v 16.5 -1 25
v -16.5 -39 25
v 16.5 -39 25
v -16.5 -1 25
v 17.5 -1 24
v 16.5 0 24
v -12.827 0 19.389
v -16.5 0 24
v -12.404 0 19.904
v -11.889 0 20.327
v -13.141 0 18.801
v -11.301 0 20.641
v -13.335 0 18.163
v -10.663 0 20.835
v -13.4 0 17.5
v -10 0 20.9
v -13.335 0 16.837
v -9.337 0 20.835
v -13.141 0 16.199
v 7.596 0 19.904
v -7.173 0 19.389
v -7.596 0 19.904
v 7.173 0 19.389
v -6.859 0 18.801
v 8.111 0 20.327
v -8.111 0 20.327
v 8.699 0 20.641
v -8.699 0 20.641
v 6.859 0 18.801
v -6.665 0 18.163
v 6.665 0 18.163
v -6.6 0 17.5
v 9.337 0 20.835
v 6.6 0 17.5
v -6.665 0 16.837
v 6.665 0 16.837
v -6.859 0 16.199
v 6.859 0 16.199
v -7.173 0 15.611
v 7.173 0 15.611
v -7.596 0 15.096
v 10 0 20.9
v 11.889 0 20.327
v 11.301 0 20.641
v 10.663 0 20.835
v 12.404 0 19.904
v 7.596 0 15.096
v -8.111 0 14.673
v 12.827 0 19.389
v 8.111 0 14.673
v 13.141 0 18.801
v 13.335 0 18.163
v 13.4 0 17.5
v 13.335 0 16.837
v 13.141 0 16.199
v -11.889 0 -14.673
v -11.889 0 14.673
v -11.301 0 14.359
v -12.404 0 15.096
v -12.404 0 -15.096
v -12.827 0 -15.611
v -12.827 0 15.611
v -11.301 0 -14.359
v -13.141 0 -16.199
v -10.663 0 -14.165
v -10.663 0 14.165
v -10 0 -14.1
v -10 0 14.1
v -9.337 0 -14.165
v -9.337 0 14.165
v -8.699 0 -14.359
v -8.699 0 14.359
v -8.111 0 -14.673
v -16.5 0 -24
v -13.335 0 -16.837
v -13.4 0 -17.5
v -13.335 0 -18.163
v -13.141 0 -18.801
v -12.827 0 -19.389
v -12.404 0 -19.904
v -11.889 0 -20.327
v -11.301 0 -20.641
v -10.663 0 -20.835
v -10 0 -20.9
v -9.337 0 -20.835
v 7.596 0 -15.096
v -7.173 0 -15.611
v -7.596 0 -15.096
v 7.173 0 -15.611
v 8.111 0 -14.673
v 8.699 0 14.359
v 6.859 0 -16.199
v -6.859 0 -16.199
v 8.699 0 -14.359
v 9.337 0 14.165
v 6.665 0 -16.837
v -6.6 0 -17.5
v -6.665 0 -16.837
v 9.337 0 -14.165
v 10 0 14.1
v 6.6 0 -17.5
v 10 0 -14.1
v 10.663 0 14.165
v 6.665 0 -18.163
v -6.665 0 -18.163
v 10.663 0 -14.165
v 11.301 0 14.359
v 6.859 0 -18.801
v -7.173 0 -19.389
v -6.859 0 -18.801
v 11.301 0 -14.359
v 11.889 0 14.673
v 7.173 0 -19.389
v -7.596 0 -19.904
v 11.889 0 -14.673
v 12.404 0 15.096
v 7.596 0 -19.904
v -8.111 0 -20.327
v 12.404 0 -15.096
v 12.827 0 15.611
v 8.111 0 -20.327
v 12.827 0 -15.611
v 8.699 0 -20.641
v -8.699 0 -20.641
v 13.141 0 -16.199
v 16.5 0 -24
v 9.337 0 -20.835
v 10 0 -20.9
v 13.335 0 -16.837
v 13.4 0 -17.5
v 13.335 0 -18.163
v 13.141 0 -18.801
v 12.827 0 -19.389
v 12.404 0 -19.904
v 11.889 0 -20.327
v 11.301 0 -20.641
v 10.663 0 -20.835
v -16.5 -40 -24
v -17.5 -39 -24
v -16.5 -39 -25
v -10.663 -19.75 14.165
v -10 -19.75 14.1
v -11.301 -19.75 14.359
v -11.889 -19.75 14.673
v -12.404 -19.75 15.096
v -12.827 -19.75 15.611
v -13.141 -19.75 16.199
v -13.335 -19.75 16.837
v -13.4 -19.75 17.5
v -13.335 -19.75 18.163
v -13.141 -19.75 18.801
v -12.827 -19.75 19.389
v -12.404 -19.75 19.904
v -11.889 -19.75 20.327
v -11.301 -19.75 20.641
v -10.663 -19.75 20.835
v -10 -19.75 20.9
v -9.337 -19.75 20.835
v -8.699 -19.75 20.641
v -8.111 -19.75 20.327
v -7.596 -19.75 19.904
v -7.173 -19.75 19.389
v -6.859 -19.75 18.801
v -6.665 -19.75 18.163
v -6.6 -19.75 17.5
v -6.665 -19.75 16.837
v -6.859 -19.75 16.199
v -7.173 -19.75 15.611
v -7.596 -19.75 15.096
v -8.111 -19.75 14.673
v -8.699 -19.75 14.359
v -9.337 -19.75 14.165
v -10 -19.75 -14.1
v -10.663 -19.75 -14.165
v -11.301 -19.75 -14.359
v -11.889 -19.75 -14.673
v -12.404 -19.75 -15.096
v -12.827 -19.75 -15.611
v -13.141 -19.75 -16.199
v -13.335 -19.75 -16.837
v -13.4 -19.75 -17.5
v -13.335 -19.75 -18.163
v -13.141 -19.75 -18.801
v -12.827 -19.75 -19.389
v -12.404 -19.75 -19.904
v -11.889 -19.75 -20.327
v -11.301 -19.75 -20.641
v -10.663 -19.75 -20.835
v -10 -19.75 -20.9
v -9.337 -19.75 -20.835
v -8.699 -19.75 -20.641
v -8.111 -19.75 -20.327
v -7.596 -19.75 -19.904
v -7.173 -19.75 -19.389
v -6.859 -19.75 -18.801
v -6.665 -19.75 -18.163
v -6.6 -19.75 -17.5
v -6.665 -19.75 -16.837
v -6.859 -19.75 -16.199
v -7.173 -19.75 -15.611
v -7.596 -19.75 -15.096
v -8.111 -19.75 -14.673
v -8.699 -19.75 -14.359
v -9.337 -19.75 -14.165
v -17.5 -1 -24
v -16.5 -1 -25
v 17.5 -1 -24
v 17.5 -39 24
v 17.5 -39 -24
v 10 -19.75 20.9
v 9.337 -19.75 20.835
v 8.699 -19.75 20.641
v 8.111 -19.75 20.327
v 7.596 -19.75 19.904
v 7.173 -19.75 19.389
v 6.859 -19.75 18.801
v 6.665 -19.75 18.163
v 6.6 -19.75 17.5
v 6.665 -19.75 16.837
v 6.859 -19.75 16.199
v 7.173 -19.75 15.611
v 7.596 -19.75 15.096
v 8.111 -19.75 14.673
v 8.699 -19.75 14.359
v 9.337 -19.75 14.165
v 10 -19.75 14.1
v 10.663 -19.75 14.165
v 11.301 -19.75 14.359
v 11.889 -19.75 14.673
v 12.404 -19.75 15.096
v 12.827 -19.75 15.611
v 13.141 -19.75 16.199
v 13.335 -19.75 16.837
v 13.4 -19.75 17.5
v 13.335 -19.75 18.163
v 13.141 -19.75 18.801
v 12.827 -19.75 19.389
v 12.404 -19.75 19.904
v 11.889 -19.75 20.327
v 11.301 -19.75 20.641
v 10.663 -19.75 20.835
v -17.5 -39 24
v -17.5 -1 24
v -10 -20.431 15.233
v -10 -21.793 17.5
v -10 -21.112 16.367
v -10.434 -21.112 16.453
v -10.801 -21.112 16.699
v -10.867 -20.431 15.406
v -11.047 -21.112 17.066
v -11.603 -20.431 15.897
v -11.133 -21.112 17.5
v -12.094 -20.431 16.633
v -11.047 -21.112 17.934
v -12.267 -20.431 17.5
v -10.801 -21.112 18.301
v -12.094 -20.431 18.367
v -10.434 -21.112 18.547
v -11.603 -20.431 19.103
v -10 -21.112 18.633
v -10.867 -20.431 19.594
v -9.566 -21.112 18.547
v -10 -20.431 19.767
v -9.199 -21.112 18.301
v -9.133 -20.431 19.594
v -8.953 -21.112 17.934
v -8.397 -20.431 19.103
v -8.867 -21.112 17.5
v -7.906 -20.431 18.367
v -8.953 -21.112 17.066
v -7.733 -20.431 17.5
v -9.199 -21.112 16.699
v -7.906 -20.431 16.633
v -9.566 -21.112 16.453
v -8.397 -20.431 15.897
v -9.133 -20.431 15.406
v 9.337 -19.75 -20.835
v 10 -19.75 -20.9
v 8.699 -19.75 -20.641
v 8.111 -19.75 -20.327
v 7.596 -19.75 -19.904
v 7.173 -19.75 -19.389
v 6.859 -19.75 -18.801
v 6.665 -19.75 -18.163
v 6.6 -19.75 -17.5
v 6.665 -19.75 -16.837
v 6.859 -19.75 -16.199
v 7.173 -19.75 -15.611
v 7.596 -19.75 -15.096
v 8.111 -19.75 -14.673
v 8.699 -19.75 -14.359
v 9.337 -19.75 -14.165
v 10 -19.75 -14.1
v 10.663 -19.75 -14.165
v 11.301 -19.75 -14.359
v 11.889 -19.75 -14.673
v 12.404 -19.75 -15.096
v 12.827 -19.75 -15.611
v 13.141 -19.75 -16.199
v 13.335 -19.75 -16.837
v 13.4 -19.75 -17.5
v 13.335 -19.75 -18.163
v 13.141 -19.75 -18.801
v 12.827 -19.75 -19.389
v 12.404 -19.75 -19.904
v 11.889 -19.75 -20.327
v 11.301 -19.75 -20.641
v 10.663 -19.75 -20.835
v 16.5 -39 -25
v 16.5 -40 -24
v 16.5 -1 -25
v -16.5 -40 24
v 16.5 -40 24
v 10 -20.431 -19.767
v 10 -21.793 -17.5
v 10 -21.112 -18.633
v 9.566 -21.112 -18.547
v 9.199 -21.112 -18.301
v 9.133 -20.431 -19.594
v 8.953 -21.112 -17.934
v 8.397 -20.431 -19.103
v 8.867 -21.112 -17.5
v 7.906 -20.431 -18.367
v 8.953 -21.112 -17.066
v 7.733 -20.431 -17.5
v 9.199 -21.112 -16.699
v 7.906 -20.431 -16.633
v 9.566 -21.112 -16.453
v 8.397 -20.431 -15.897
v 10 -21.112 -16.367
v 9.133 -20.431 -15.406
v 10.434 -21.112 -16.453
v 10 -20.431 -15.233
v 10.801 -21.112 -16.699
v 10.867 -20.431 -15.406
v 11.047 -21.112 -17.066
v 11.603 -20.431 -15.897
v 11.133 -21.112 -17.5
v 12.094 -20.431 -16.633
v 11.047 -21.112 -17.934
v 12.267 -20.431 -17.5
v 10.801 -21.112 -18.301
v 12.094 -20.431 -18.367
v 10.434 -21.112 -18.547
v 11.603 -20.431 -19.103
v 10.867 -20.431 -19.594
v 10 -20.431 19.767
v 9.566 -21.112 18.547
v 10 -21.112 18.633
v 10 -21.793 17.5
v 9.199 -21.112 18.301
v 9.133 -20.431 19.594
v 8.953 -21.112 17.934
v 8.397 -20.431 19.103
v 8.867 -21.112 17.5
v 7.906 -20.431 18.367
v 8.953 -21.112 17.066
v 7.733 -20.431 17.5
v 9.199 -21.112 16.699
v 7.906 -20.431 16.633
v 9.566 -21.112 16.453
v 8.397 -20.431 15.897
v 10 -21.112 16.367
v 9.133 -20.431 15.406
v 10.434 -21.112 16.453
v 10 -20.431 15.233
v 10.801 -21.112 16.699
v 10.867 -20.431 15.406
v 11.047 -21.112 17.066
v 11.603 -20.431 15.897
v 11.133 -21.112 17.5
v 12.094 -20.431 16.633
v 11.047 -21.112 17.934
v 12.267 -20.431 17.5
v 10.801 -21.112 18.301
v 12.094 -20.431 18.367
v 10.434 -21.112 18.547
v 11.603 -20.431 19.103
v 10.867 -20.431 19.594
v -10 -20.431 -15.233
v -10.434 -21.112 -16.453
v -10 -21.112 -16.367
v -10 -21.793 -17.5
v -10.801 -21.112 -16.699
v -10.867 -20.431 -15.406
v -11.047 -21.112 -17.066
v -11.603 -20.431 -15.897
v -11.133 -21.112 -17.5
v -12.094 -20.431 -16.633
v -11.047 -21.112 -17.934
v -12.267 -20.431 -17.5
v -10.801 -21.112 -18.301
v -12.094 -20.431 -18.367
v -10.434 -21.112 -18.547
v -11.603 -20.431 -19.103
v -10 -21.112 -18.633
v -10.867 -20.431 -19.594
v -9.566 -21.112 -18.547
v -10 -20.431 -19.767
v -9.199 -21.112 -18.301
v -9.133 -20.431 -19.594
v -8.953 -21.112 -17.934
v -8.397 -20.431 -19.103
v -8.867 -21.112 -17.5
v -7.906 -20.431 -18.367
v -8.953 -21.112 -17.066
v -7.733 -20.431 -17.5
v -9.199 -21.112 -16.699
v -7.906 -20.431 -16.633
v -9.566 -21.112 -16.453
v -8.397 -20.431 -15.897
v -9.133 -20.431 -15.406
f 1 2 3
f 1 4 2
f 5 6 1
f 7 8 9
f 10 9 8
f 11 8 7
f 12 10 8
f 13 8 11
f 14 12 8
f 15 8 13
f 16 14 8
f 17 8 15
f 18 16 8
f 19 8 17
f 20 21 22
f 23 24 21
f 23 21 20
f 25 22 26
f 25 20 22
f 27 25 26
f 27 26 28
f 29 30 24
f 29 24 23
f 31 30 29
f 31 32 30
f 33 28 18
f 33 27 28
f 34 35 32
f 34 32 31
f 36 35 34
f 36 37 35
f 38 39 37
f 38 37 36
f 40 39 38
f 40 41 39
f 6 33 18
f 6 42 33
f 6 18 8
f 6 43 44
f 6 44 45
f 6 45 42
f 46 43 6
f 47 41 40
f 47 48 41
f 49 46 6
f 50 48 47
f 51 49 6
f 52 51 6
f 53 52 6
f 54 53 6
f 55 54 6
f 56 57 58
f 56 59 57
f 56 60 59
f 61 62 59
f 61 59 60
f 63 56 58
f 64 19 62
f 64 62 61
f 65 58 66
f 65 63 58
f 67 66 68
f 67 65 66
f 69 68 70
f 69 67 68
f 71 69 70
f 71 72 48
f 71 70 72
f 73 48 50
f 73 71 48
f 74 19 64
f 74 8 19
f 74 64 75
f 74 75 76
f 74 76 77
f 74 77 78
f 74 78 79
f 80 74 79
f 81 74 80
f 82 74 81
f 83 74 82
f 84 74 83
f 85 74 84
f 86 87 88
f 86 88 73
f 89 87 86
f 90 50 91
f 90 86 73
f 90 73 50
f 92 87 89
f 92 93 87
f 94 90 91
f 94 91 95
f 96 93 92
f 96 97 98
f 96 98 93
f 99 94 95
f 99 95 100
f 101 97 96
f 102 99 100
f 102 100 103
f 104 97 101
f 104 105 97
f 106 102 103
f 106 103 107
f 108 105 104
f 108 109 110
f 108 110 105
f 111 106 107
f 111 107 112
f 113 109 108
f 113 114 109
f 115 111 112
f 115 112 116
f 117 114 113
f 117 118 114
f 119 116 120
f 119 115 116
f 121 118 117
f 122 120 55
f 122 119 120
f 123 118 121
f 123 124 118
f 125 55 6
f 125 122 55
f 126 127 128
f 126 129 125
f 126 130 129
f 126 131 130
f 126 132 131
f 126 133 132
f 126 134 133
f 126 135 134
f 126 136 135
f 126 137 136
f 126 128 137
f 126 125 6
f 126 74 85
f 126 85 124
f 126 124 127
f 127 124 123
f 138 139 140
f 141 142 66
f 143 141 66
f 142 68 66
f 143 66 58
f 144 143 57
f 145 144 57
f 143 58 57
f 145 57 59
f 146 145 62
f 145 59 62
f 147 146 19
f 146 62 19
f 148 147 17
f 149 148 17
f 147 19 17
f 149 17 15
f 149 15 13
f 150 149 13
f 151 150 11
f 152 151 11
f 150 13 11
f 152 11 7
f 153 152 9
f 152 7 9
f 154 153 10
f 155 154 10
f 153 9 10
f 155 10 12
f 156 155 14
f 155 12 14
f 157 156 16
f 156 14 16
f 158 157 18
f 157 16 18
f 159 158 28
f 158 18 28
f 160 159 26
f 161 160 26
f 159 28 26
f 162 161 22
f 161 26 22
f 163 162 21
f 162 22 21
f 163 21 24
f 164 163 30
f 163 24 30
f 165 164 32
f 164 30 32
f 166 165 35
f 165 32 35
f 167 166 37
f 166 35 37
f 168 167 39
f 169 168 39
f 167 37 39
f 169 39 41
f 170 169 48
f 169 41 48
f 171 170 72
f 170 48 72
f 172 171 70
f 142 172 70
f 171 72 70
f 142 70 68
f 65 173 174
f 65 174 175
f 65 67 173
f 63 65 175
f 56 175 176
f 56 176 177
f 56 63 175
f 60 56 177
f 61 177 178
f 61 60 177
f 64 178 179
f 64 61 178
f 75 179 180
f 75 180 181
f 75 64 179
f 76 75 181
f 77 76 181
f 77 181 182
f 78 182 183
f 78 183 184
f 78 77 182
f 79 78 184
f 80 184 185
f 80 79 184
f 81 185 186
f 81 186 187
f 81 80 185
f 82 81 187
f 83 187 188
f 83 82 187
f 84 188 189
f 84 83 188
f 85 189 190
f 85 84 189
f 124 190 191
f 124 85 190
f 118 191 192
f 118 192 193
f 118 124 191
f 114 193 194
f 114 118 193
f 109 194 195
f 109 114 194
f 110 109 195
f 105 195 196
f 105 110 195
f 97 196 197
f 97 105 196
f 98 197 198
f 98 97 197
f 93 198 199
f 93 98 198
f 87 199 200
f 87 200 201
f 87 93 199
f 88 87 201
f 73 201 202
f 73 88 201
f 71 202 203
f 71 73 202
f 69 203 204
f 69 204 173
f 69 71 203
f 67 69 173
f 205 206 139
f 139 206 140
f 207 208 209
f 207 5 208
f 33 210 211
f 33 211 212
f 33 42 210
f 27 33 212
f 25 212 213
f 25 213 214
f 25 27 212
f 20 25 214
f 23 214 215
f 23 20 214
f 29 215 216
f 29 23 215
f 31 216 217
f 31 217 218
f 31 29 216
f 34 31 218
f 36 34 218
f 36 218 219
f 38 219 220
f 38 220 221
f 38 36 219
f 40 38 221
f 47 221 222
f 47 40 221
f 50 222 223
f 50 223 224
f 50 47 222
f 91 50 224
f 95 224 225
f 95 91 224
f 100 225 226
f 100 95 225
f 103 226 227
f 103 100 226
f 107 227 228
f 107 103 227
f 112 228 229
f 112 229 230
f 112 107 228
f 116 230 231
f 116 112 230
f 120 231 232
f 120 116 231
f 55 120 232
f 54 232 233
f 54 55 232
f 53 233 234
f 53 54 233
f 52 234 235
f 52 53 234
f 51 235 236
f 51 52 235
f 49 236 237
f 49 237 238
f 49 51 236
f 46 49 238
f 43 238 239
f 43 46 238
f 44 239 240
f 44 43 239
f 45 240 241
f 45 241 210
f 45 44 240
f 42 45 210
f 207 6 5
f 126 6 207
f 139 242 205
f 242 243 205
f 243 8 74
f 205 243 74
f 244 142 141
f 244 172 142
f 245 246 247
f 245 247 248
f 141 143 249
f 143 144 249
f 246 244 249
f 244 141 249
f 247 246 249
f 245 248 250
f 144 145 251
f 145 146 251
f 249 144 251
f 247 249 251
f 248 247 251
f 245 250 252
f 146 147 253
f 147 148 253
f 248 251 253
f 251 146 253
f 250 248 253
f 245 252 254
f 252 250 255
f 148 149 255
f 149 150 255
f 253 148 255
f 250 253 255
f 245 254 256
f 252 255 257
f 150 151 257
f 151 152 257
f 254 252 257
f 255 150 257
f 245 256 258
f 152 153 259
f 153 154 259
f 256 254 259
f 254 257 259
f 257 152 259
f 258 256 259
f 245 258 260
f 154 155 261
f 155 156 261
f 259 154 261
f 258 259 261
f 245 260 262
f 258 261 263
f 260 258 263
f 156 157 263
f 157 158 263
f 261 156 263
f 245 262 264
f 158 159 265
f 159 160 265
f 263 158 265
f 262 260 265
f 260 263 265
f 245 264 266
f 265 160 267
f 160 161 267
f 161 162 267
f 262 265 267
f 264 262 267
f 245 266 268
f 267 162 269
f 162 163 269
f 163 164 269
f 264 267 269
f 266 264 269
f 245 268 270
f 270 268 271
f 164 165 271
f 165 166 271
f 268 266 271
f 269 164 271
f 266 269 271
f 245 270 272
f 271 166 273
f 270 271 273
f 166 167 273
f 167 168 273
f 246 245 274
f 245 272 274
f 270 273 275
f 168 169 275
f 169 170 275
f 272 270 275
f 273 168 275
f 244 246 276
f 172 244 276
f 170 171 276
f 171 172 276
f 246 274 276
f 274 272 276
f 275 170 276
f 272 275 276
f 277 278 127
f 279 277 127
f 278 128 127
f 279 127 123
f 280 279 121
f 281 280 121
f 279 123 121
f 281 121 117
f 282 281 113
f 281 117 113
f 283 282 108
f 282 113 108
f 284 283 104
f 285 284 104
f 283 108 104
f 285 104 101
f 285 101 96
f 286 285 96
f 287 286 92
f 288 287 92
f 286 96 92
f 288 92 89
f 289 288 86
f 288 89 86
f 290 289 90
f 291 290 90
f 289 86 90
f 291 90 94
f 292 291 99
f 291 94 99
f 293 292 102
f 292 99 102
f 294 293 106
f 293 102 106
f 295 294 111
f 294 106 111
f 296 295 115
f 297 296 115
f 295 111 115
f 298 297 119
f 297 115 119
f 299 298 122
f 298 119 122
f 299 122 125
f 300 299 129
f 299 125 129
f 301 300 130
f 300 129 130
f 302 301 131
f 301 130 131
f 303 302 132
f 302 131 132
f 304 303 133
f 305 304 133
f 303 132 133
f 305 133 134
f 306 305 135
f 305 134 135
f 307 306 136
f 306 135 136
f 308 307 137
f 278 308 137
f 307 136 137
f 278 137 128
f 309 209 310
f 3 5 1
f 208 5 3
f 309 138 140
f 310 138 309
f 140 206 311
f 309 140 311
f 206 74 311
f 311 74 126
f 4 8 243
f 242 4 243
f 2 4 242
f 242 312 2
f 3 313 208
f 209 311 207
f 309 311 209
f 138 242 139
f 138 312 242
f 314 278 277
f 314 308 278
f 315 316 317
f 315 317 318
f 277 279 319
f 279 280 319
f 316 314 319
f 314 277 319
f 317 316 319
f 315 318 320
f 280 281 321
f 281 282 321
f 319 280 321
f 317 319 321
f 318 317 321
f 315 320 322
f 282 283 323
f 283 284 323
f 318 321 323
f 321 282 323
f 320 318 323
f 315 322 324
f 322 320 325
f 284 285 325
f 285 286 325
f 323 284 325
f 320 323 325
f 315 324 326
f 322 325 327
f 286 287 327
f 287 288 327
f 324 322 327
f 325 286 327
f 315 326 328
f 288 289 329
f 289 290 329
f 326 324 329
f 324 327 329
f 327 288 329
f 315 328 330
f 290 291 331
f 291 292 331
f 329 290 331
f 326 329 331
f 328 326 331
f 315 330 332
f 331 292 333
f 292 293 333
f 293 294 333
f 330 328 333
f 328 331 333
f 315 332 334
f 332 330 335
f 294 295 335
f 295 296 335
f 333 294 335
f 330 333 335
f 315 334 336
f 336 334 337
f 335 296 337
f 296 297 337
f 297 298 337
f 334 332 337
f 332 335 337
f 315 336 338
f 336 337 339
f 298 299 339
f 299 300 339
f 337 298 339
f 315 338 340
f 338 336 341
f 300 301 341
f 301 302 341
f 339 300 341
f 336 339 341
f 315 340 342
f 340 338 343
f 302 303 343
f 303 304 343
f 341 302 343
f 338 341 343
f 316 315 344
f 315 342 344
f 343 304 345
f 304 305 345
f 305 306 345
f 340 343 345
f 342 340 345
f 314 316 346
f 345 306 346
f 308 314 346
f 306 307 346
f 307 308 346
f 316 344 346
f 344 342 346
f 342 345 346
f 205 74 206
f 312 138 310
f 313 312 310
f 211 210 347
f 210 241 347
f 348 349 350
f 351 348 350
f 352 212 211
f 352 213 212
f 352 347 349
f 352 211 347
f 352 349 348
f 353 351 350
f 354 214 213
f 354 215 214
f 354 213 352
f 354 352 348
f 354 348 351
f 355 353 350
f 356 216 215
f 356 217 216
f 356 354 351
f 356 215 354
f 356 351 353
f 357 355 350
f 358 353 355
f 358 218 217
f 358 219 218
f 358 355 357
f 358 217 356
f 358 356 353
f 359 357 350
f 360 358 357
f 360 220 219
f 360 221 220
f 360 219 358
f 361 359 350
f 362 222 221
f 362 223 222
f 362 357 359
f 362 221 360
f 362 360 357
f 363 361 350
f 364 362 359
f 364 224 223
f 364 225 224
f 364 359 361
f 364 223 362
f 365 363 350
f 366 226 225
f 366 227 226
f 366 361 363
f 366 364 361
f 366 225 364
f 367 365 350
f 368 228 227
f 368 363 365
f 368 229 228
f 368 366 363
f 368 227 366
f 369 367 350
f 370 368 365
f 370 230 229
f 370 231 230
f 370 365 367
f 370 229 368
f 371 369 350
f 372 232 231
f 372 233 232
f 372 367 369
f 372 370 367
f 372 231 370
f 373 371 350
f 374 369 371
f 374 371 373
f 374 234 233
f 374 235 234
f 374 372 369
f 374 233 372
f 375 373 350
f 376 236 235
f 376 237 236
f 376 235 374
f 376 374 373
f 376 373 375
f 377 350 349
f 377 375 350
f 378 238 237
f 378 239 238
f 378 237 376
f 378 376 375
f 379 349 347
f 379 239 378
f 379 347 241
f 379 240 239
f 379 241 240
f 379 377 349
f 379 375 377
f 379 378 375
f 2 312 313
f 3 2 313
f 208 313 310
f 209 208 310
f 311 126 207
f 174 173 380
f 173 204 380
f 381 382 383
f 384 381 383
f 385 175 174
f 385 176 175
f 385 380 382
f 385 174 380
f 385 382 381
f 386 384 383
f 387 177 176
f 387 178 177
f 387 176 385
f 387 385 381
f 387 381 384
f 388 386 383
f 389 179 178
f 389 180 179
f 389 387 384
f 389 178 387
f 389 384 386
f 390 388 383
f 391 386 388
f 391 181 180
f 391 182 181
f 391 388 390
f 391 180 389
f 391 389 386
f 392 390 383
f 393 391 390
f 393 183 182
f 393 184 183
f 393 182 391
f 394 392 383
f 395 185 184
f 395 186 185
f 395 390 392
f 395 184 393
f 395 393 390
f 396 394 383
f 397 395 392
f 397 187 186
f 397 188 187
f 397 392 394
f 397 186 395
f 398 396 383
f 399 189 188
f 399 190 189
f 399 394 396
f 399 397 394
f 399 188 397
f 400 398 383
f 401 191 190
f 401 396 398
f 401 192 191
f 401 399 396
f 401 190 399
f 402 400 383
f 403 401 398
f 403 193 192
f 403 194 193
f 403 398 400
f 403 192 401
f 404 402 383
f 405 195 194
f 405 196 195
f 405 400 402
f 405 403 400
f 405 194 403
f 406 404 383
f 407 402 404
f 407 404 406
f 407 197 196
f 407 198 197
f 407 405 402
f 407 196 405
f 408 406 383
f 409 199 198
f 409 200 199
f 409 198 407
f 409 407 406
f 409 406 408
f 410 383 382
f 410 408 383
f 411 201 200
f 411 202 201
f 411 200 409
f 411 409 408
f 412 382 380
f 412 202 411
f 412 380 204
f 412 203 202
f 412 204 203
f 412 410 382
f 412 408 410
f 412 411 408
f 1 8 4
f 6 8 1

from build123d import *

# Parameters (mm, degrees)
SKETCH1_W                  = 35
SKETCH1_H                  = 50
BOSS_EXTRUDE1_DEPTH        = 40
CHAMFER1_SIZE              = 1
M8_TAPPED_HOLE1_AT_2_COUNT = 2
M8_TAPPED_HOLE1_AT_2_PITCH = 40.311288741


with BuildPart() as part:
    # Sketch1 → Boss-Extrude1 (new body)
    with BuildSketch(Plane(origin=(0, 0, 0), x_dir=(1, 0, 0), z_dir=(0, 1, 0))):
        Rectangle(SKETCH1_W, SKETCH1_H)
    extrude(amount=-BOSS_EXTRUDE1_DEPTH)

    # Chamfer1
    chamfer1_edges = [part.edges().sort_by_distance(p)[0] for p in [
        (-17.5, -40, 0),
        (0, -40, 25),
        (17.5, -40, 0),
        (0, 0, 25),
        (-17.5, 0, 0),
        (0, 0, -25),
        (17.5, 0, 0),
        (17.5, -20, 25),
        (-17.5, -20, 25),
        (-17.5, -20, -25),
        (17.5, -20, -25),
        (0, -40, -25),
    ]]
    chamfer(chamfer1_edges, length=CHAMFER1_SIZE)

    # Sketch3 → M8 Tapped Hole1 (revolve, cut)
    with BuildSketch(Plane(origin=(-10, 0, -17.5), x_dir=(0, 0, 1), z_dir=(1, 0, 0))):
        Polygon((0, 0), (0, 21.792926105), (3.4, 19.75), (3.4, 0), align=None)
    m8_tapped_hole1 = revolve(axis=Axis((-10, 6.35, -17.5), (0, -1, 0)), mode=Mode.SUBTRACT)

    # M8 Tapped Hole1 at 2: M8 Tapped Hole1 ×2
    with Locations(*[Vector(0.4961389383568339, 0, 0.8682431421244592) * (i * M8_TAPPED_HOLE1_AT_2_PITCH) for i in range(1, M8_TAPPED_HOLE1_AT_2_COUNT)]):
        add(m8_tapped_hole1, mode=Mode.SUBTRACT)

    # Mirror1: M8 Tapped Hole1 across plane
    add(m8_tapped_hole1.mirror(Plane.XY), mode=Mode.SUBTRACT)

    # Mirror1 copy 1 sketch → Mirror1 copy 1 (revolve, cut)
    with BuildSketch(Plane(origin=(10, 0, -17.5), x_dir=(0, 0, -1), z_dir=(1, 0, 0))):
        Polygon((0, 0), (0, -21.792926105), (3.4, -19.75), (3.4, 0), align=None)
    revolve(axis=Axis((10, 6.35, -17.5), (0, 1, 0)), mode=Mode.SUBTRACT)


solid = part.part
